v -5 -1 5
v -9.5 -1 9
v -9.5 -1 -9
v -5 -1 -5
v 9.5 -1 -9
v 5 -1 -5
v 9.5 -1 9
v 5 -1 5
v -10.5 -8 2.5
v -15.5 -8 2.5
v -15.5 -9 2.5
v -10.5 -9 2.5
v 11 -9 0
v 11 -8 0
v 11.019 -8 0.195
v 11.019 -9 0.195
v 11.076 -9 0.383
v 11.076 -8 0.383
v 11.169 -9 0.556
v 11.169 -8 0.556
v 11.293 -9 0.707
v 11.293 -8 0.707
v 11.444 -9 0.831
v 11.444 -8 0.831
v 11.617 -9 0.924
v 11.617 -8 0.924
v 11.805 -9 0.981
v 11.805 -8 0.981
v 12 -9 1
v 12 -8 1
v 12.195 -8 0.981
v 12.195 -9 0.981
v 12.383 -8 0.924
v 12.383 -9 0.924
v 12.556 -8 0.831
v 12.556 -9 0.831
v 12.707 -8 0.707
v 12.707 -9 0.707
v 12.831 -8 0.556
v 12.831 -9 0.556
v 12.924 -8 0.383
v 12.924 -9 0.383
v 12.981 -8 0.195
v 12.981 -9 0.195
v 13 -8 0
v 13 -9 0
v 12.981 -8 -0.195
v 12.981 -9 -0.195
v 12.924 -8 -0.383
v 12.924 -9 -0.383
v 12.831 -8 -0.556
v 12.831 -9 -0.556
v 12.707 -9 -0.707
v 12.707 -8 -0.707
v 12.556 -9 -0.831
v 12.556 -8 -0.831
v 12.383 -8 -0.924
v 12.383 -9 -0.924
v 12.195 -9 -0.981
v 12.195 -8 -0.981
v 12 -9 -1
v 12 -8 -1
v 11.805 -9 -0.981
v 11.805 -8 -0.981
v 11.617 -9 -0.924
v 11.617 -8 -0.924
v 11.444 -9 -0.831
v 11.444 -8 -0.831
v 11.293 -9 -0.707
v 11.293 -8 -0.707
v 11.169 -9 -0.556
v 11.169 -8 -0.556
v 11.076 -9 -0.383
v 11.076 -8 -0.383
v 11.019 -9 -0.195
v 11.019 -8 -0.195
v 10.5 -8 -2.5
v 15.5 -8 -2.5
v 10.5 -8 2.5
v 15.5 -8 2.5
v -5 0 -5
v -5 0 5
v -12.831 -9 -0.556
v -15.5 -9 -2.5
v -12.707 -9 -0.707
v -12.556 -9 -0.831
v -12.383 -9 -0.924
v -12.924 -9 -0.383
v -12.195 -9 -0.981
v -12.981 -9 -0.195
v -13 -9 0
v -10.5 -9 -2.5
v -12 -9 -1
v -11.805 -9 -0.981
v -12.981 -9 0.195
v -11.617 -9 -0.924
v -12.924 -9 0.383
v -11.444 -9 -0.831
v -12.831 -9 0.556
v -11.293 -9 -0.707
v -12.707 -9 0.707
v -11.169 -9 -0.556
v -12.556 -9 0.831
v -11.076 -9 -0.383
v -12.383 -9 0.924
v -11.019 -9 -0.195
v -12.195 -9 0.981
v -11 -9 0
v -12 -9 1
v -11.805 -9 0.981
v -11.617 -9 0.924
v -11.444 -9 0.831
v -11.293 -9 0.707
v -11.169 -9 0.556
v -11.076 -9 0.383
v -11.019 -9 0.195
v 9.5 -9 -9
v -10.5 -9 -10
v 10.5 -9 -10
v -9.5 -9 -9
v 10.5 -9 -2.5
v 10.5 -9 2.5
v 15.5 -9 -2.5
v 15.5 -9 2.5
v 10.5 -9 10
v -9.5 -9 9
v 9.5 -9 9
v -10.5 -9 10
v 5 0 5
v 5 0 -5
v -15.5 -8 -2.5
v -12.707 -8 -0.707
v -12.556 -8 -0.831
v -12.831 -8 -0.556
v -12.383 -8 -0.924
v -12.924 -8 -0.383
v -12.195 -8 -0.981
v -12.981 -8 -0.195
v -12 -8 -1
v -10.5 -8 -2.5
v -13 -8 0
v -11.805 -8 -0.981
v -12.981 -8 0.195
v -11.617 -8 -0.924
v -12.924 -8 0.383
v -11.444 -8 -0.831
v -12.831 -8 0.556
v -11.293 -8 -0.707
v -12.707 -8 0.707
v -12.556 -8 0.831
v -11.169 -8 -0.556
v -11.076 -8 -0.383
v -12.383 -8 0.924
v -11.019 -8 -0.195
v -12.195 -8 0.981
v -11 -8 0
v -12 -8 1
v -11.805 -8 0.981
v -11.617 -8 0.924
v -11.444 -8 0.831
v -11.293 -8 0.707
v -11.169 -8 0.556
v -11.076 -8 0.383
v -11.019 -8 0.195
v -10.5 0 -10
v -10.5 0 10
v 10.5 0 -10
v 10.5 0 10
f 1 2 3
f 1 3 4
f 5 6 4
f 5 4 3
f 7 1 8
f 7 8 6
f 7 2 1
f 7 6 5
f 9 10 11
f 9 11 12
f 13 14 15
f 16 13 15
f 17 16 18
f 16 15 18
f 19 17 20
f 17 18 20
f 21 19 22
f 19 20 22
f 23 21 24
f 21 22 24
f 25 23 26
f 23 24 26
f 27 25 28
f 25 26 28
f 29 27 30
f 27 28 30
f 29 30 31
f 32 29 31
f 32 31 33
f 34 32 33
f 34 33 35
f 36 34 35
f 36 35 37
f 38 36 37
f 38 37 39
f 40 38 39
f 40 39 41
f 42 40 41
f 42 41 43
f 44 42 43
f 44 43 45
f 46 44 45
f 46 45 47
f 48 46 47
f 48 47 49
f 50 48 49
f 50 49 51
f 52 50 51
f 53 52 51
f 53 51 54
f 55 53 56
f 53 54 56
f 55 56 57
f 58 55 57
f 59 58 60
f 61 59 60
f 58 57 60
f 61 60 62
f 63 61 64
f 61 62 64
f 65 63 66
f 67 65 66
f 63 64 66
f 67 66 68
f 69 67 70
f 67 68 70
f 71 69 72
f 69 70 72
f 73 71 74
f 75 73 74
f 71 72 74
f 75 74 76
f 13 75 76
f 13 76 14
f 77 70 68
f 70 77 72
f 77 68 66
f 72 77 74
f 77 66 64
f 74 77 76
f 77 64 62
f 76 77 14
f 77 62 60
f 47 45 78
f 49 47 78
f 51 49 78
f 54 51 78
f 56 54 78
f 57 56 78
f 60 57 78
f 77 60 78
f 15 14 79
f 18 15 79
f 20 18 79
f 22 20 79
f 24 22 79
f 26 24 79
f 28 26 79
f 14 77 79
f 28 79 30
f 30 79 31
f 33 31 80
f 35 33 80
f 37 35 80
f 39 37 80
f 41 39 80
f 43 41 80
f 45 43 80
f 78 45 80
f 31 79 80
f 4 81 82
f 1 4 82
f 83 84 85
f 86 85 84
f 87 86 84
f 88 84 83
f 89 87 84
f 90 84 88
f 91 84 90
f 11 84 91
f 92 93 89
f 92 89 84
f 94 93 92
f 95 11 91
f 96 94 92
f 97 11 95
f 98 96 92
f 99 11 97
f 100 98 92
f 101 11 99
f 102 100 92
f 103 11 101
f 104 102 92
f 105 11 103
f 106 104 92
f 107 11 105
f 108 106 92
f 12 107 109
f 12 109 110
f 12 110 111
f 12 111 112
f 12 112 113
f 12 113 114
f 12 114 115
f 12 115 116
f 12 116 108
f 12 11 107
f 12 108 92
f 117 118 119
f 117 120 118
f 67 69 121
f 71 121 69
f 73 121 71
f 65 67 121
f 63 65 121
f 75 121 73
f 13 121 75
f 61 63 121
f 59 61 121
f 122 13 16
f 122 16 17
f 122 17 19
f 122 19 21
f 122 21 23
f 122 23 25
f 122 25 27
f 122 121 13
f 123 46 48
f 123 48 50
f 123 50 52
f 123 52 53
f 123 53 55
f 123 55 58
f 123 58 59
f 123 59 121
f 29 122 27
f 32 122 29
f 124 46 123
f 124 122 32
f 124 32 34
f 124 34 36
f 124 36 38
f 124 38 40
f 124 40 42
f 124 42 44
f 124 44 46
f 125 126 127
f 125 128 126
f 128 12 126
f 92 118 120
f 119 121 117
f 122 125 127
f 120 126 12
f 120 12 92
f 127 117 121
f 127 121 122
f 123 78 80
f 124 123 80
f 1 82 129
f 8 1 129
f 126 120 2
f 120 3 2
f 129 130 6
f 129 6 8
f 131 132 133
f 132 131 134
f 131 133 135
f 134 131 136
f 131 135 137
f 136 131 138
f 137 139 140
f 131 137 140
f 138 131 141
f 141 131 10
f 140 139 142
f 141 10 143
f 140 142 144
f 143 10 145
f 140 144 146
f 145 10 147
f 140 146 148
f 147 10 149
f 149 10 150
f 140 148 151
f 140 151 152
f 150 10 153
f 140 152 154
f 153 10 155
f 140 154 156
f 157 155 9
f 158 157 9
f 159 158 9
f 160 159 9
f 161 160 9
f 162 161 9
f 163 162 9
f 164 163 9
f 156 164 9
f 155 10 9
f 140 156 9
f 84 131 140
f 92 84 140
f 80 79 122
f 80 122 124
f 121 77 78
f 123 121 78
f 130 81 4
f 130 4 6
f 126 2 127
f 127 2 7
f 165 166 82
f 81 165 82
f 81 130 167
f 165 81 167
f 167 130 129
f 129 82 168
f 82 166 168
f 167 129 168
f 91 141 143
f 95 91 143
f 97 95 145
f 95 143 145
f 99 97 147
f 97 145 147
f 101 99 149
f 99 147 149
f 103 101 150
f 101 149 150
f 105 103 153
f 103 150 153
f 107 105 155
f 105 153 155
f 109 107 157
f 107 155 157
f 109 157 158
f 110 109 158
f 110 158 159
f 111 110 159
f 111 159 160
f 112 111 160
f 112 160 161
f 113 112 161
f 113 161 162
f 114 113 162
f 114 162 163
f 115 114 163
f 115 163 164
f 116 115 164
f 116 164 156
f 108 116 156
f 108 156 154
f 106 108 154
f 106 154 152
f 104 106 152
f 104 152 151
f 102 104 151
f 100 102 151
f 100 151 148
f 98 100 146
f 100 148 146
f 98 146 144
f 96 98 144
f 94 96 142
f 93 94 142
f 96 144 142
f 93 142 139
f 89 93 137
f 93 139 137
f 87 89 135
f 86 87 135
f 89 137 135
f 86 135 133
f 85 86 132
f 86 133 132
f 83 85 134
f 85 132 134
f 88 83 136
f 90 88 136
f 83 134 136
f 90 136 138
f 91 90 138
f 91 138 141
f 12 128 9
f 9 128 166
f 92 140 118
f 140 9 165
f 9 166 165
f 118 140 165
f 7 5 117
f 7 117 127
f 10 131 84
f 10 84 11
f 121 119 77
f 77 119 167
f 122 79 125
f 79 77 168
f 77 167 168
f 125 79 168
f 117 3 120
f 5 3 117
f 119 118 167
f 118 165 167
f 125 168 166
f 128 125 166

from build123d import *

# Parameters (mm, degrees)
F0_W     = 21
F0_H     = 20
F0_W_2   = 19
F0_H_2   = 18
F0_W_3   = 18
F0_H_3   = 17
F0_W_4   = 10
F0_H_4   = 10
F1_DEPTH = 1
F2_W     = 21
F2_H     = 20
F2_W_2   = 19
F2_H_2   = 18
F3_DEPTH = 7
F4_W     = 19
F4_H     = 18
F4_W_2   = 5
F4_H_2   = 5
F5_DEPTH = 1
F7_D     = 2


with BuildPart() as f1:
    # F0 (on Front) → F1 (new body)
    with BuildSketch(Plane.XZ):
        Rectangle(F0_W, F0_H)
        Rectangle(F0_W_2, F0_H_2, mode=Mode.SUBTRACT)
        Rectangle(F0_W_2, F0_H_2)
        Rectangle(F0_W_3, F0_H_3, mode=Mode.SUBTRACT)
        Rectangle(F0_W_3, F0_H_3)
        Rectangle(F0_W_4, F0_H_4, mode=Mode.SUBTRACT)
    extrude(amount=F1_DEPTH)

    # F2 (on face) → F3 (join)
    with BuildSketch(Plane.XZ.offset(1)):
        Rectangle(F2_W, F2_H)
        Rectangle(F2_W_2, F2_H_2, mode=Mode.SUBTRACT)
    extrude(amount=F3_DEPTH)

    # F4 (on face) → F5 (join)
    with BuildSketch(Plane.XZ.offset(8)):
        Polygon((10.5, 2.5), (10.5, 10), (-10.5, 10), (-10.5, 2.5), (-10.5, -2.5), (-10.5, -10), (10.5, -10), (10.5, -2.5), align=None)
        Rectangle(F4_W, F4_H, mode=Mode.SUBTRACT)
        with Locations((13, 0)):
            Rectangle(F4_W_2, F4_H_2)
        with Locations((-13, 0)):
            Rectangle(F4_W_2, F4_H_2)
    extrude(amount=F5_DEPTH)

    # F7 (through all)
    with Locations(Plane.XZ.offset(9)):
        with Locations((-12, 0), (12, 0)):
            Hole(F7_D / 2)


solid = f1.part
